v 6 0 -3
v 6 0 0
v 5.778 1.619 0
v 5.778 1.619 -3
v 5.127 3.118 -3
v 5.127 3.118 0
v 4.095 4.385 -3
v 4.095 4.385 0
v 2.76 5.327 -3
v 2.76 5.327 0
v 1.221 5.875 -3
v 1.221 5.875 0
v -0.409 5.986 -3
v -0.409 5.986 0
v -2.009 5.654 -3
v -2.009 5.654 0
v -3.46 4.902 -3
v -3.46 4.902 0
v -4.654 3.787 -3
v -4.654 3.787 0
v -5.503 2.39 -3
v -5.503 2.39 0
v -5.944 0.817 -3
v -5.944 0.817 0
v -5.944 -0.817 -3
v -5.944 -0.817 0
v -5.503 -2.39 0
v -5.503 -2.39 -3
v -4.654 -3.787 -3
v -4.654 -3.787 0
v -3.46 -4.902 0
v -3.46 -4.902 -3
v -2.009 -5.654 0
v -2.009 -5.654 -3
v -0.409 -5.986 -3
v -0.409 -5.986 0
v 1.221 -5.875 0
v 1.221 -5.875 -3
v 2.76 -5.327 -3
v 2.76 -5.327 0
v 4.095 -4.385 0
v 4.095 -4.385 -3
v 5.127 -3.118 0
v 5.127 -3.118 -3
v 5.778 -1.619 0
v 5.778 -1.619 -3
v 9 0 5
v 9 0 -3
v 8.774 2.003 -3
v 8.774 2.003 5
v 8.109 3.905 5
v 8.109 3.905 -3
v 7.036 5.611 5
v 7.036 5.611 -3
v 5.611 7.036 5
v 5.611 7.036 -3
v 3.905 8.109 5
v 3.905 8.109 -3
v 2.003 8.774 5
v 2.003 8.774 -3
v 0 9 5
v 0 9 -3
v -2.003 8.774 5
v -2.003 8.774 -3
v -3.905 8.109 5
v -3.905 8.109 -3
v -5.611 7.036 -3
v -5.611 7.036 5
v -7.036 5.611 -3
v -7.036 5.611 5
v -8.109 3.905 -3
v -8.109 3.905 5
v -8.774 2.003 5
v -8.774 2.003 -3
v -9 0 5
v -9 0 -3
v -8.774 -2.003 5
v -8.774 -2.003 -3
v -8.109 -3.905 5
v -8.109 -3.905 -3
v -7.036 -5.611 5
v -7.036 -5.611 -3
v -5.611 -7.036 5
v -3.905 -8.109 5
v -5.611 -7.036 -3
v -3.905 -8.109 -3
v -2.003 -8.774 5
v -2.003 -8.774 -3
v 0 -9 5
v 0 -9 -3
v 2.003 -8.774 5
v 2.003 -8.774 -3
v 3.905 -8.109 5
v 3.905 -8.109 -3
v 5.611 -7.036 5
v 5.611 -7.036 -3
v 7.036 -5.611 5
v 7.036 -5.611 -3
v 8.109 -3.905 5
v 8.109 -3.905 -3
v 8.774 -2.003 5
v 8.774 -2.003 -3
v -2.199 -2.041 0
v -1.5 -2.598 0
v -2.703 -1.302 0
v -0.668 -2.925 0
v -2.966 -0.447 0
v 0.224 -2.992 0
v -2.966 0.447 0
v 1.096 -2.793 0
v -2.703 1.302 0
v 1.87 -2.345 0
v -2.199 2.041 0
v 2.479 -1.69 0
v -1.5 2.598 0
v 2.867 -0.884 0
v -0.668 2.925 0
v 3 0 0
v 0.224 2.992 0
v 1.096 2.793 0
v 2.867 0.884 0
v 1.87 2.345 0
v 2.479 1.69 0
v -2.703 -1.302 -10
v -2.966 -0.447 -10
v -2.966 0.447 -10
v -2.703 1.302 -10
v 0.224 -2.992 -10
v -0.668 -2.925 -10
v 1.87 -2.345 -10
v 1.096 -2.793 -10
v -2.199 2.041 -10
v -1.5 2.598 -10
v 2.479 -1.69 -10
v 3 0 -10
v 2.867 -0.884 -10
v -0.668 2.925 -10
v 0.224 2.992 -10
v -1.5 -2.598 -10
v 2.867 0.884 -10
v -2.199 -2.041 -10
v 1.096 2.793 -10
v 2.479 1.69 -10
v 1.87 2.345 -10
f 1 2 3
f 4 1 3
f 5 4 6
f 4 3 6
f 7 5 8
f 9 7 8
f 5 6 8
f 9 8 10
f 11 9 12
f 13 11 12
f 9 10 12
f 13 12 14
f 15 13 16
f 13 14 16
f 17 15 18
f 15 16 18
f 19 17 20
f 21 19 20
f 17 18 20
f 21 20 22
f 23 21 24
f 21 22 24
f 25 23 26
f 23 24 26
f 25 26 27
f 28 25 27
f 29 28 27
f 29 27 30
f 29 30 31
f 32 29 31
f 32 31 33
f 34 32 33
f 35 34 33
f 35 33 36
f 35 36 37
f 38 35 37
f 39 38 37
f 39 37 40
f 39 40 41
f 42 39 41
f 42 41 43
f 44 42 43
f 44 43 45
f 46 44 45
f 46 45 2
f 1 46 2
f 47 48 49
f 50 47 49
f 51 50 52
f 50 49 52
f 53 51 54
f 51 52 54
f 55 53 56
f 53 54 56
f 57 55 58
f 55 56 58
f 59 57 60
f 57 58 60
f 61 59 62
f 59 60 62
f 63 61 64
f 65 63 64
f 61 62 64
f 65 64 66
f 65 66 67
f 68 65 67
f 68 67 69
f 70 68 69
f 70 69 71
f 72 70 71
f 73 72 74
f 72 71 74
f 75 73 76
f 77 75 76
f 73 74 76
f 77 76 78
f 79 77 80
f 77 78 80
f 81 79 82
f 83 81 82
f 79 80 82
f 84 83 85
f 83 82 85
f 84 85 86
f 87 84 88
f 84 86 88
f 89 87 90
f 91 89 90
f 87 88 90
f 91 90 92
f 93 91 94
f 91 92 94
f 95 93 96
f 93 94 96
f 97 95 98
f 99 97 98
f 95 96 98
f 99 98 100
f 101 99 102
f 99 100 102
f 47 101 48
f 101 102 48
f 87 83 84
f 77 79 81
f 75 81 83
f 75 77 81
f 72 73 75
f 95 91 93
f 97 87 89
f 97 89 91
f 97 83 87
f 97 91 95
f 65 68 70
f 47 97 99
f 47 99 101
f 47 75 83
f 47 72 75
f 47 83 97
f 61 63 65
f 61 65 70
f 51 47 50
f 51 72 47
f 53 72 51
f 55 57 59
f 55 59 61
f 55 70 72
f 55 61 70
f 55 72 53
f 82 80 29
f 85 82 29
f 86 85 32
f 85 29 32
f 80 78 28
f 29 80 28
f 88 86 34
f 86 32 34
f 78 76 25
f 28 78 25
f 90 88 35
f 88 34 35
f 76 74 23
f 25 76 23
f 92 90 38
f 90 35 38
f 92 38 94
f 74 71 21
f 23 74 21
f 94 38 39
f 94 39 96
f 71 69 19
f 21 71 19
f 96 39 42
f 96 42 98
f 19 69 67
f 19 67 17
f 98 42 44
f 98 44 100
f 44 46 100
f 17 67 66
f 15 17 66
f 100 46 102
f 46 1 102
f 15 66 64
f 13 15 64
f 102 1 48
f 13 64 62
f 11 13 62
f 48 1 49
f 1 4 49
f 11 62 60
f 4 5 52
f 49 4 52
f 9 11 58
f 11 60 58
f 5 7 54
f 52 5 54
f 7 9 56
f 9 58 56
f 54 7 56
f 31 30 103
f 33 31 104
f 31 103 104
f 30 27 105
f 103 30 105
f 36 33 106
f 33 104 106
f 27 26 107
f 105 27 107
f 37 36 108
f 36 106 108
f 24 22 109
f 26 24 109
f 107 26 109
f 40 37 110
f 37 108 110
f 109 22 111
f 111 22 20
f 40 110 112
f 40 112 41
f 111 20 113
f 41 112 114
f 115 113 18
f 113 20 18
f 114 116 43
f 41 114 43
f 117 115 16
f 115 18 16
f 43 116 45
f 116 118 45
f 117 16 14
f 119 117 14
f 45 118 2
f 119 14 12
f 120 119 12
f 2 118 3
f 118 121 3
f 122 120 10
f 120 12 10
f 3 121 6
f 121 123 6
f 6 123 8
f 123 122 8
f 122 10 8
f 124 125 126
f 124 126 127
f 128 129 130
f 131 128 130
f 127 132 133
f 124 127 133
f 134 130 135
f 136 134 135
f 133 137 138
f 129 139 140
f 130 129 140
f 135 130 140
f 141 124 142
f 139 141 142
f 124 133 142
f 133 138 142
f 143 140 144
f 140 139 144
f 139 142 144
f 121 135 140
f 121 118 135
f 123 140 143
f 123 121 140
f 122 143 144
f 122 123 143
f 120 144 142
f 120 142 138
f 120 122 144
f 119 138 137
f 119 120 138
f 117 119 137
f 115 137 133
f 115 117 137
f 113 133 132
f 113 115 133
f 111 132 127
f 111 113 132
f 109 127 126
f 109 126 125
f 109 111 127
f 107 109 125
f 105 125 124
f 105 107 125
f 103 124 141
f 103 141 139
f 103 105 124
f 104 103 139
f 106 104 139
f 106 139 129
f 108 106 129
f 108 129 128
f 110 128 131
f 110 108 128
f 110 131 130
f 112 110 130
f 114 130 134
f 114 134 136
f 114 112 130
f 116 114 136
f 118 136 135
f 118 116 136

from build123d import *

# Parameters (mm, degrees)
RESSALTO_EXTRUS_O1_DEPTH      = 5
RESSALTO_EXTRUS_O1_DEPTH_BACK = 3
ESBO_O1_R                     = 9
ESBO_O2_R                     = 3
RESSALTO_EXTRUS_O2_DEPTH      = 10
ESBO_O3_R                     = 6
ESBO_O3_R_2                   = 3
CORTE_EXTRUS_O1_DEPTH         = 10


with BuildPart() as part:
    # Esboço1 → Ressalto-extrusão1 (new, two sides: drawn at the far end of the back side and taken through both)
    with BuildSketch(Plane.XY.offset(-RESSALTO_EXTRUS_O1_DEPTH_BACK)):
        Circle(ESBO_O1_R)
    extrude(amount=RESSALTO_EXTRUS_O1_DEPTH + RESSALTO_EXTRUS_O1_DEPTH_BACK)

    # Esboço2 → Ressalto-extrusão2 (add)
    with BuildSketch(Plane.XY):
        Circle(ESBO_O2_R)
    extrude(amount=-RESSALTO_EXTRUS_O2_DEPTH)

    # Esboço3 → Corte-extrusão1 (cut)
    with BuildSketch(Plane.XY):
        Circle(ESBO_O3_R)
        Circle(ESBO_O3_R_2, mode=Mode.SUBTRACT)
    extrude(amount=-CORTE_EXTRUS_O1_DEPTH, mode=Mode.SUBTRACT)


solid = part.part
